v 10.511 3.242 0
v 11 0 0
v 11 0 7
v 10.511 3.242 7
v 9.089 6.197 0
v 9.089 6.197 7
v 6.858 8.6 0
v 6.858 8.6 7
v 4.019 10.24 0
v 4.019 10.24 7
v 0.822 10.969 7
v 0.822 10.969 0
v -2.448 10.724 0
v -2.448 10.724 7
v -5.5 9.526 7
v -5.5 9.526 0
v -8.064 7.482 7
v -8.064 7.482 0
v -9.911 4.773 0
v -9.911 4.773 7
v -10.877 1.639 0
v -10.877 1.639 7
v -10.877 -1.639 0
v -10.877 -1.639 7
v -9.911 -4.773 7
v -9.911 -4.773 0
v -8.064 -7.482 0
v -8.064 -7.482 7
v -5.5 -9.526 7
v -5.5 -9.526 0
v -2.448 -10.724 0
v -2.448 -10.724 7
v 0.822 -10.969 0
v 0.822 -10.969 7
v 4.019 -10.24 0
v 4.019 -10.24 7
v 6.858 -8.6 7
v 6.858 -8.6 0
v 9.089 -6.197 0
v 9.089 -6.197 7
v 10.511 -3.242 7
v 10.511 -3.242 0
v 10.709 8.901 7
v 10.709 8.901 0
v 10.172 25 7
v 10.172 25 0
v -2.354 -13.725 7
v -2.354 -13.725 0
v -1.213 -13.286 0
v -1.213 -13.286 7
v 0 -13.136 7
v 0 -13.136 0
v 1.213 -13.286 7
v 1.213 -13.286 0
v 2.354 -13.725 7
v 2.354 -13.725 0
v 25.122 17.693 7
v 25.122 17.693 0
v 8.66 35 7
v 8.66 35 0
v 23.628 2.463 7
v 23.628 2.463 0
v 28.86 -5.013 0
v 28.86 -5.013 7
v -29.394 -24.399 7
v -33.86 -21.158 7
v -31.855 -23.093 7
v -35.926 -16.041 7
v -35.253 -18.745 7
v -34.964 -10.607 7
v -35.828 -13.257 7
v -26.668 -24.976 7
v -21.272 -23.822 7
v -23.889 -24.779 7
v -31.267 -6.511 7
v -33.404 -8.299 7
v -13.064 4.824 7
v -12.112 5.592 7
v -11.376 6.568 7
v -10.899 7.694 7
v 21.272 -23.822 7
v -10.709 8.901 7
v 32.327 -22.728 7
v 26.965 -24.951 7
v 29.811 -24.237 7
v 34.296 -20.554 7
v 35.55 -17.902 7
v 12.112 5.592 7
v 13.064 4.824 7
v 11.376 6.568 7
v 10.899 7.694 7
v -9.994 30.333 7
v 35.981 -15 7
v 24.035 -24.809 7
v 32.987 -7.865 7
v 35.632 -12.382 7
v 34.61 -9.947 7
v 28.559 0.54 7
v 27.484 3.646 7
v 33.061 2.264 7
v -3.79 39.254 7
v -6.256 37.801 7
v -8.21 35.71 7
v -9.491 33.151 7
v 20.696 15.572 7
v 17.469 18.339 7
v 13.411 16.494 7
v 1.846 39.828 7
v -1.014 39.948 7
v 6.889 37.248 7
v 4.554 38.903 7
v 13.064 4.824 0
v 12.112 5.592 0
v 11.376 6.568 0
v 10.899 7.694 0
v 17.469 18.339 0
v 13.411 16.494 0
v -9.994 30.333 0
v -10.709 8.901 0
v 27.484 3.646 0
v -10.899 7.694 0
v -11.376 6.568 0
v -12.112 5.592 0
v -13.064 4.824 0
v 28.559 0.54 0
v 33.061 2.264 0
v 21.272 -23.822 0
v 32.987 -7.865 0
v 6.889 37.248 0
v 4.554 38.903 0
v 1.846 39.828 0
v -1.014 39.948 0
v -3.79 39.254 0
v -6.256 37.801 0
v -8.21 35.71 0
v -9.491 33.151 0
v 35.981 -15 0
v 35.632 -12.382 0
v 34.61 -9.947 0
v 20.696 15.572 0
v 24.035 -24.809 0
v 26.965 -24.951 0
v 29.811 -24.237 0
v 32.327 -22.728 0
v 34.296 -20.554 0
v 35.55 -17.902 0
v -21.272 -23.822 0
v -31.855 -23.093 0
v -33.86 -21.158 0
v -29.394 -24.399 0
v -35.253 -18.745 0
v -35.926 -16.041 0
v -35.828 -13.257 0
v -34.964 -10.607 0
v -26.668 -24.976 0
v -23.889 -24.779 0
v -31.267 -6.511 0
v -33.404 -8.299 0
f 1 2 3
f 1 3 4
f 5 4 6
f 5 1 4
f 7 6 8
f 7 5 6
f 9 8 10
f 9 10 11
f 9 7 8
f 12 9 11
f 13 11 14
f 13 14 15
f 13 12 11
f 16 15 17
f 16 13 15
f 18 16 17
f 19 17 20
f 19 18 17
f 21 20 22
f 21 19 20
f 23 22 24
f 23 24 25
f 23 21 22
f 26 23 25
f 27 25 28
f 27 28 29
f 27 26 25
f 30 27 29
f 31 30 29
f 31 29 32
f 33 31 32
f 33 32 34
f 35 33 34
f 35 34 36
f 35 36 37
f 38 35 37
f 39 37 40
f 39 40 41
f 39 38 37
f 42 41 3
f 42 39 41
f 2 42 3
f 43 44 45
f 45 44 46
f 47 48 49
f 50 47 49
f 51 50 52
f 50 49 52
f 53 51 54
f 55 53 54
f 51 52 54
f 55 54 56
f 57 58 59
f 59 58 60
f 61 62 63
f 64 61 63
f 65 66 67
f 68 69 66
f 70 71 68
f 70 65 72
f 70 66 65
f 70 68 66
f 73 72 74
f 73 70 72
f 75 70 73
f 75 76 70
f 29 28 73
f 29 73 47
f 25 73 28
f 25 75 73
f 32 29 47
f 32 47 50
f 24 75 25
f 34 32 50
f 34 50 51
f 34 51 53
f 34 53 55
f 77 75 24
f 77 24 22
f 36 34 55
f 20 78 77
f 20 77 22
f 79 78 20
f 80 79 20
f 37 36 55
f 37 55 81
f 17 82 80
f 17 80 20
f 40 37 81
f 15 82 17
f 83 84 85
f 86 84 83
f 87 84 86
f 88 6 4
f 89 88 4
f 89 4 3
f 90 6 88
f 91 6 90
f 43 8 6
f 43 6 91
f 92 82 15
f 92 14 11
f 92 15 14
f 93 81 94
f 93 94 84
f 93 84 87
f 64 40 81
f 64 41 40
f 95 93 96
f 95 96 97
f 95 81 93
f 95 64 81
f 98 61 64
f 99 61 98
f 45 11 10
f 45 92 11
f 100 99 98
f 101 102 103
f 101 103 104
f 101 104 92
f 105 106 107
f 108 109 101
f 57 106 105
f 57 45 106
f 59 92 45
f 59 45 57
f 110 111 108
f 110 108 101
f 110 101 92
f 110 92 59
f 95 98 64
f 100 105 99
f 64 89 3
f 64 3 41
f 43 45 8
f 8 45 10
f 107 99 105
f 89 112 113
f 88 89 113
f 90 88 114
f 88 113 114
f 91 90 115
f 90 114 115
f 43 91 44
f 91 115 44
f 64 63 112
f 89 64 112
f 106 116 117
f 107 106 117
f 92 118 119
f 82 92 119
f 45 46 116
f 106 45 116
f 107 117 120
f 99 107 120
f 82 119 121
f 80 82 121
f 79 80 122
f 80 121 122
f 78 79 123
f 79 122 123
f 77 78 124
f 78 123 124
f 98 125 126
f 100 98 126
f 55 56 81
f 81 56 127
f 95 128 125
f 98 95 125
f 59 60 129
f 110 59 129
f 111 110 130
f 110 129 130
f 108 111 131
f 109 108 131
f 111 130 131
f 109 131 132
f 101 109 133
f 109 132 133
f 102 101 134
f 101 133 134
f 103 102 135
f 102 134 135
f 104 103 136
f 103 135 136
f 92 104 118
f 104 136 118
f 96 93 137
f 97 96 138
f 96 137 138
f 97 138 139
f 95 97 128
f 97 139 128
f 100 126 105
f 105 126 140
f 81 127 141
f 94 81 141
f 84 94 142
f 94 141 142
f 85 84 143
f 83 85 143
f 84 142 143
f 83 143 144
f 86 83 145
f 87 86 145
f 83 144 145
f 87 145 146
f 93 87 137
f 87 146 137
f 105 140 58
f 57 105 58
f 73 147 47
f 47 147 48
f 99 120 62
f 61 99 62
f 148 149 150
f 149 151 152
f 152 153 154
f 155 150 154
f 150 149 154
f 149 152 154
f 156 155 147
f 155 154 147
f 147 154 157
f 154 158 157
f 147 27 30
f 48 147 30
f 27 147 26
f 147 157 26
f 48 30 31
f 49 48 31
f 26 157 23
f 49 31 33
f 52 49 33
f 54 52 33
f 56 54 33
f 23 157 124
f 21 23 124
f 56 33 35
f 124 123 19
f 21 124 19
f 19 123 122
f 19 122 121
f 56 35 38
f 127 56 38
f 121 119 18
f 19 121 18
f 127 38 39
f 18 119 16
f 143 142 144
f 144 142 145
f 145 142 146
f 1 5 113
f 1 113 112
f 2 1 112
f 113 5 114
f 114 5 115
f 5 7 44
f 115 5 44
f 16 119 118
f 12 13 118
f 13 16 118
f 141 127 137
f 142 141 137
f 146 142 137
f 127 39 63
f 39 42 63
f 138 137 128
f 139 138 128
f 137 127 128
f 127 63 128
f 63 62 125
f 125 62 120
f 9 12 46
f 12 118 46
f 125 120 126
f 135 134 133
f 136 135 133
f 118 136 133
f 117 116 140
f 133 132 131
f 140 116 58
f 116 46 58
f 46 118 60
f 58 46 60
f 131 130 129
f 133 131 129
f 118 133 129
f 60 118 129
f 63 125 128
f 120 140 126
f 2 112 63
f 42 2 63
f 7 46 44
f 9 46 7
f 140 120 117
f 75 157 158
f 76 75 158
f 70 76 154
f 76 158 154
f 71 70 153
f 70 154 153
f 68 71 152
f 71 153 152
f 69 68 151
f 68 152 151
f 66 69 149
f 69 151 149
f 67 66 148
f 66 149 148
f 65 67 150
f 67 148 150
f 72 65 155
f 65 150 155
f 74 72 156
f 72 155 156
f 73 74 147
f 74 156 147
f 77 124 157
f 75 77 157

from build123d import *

# Parameters (mm, degrees)
F0_R     = 11
F1_DEPTH = 7


with BuildPart() as f1:
    # F0 (on Top) → F1 (new body)
    with BuildSketch(Plane.XY):
        with BuildLine():
            ThreePointArc((9.994443, 30.333333), (9.998611, 30.16669), (10, 30))
            ThreePointArc((10, 30), (-0.16669, 20.001389), (-9.994443, 30.333333))
            Line((-9.994443, 30.333333), (-10.709236, 8.901461))
            ThreePointArc((-10.709236, 8.901461), (-11.37633, 6.568127), (-13.063509, 4.82374))
            Line((-13.063509, 4.82374), (-31.266659, -6.511225))
            ThreePointArc((-31.266659, -6.511225), (-21.125814, -6.257604), (-15.980762, -15))
            ThreePointArc((-15.980762, -15), (-17.405056, -20.143663), (-21.272216, -23.822108))
            Line((-21.272216, -23.822108), (-2.354273, -13.725201))
            ThreePointArc((-2.354273, -13.725201), (0, -13.136255), (2.354273, -13.725201))
            Line((2.354273, -13.725201), (21.272216, -23.822108))
            ThreePointArc((21.272216, -23.822108), (17.320508, -10), (31.266659, -6.511225))
            Line((31.266659, -6.511225), (28.860169, -5.012722))
            Line((28.860169, -5.012722), (13.063509, 4.82374))
            ThreePointArc((13.063509, 4.82374), (11.37633, 6.568127), (10.709236, 8.901461))
            Line((10.709236, 8.901461), (10.17232, 25))
            Line((10.17232, 25), (9.994443, 30.333333))
        make_face()
        Circle(F0_R, mode=Mode.SUBTRACT)
        with BuildLine():
            ThreePointArc((-9.994443, 30.333333), (-0.16669, 20.001389), (10, 30))
            ThreePointArc((10, 30), (9.998611, 30.16669), (9.994443, 30.333333))
            ThreePointArc((9.994443, 30.333333), (9.614774, 32.748841), (8.660254, 35))
            ThreePointArc((8.660254, 35), (-2.426821, 39.701059), (-9.994443, 30.333333))
        make_face()
        with BuildLine():
            ThreePointArc((-15.980762, -15), (-21.125814, -6.257604), (-31.266659, -6.511225))
            ThreePointArc((-31.266659, -6.511225), (-34.641016, -20), (-21.272216, -23.822108))
            ThreePointArc((-21.272216, -23.822108), (-17.405056, -20.143663), (-15.980762, -15))
        make_face()
        with BuildLine():
            ThreePointArc((32.987055, -7.864745), (32.164004, -7.140769), (31.266659, -6.511225))
            ThreePointArc((31.266659, -6.511225), (17.320508, -10), (21.272216, -23.822108))
            ThreePointArc((21.272216, -23.822108), (31.124425, -23.575706), (35.980762, -15))
            ThreePointArc((35.980762, -15), (35.202013, -11.131081), (32.987055, -7.864745))
        make_face()
        with BuildLine():
            ThreePointArc((8.660254, 35), (9.614774, 32.748841), (9.994443, 30.333333))
            Line((9.994443, 30.333333), (10.17232, 25))
            Line((10.17232, 25), (17.468503, 18.338699))
            Line((17.468503, 18.338699), (13.411126, 16.494436))
            Line((13.411126, 16.494436), (27.48383, 3.646278))
            Line((27.48383, 3.646278), (23.627748, 2.462574))
            Line((23.627748, 2.462574), (28.860169, -5.012722))
            Line((28.860169, -5.012722), (31.266659, -6.511225))
            ThreePointArc((31.266659, -6.511225), (32.164004, -7.140769), (32.987055, -7.864745))
            Line((32.987055, -7.864745), (28.558979, 0.540369))
            Line((28.558979, 0.540369), (33.061294, 2.263841))
            Line((33.061294, 2.263841), (20.695962, 15.572305))
            Line((20.695962, 15.572305), (25.122192, 17.693207))
            Line((25.122192, 17.693207), (8.660254, 35))
        make_face()
    extrude(amount=F1_DEPTH)


solid = f1.part
